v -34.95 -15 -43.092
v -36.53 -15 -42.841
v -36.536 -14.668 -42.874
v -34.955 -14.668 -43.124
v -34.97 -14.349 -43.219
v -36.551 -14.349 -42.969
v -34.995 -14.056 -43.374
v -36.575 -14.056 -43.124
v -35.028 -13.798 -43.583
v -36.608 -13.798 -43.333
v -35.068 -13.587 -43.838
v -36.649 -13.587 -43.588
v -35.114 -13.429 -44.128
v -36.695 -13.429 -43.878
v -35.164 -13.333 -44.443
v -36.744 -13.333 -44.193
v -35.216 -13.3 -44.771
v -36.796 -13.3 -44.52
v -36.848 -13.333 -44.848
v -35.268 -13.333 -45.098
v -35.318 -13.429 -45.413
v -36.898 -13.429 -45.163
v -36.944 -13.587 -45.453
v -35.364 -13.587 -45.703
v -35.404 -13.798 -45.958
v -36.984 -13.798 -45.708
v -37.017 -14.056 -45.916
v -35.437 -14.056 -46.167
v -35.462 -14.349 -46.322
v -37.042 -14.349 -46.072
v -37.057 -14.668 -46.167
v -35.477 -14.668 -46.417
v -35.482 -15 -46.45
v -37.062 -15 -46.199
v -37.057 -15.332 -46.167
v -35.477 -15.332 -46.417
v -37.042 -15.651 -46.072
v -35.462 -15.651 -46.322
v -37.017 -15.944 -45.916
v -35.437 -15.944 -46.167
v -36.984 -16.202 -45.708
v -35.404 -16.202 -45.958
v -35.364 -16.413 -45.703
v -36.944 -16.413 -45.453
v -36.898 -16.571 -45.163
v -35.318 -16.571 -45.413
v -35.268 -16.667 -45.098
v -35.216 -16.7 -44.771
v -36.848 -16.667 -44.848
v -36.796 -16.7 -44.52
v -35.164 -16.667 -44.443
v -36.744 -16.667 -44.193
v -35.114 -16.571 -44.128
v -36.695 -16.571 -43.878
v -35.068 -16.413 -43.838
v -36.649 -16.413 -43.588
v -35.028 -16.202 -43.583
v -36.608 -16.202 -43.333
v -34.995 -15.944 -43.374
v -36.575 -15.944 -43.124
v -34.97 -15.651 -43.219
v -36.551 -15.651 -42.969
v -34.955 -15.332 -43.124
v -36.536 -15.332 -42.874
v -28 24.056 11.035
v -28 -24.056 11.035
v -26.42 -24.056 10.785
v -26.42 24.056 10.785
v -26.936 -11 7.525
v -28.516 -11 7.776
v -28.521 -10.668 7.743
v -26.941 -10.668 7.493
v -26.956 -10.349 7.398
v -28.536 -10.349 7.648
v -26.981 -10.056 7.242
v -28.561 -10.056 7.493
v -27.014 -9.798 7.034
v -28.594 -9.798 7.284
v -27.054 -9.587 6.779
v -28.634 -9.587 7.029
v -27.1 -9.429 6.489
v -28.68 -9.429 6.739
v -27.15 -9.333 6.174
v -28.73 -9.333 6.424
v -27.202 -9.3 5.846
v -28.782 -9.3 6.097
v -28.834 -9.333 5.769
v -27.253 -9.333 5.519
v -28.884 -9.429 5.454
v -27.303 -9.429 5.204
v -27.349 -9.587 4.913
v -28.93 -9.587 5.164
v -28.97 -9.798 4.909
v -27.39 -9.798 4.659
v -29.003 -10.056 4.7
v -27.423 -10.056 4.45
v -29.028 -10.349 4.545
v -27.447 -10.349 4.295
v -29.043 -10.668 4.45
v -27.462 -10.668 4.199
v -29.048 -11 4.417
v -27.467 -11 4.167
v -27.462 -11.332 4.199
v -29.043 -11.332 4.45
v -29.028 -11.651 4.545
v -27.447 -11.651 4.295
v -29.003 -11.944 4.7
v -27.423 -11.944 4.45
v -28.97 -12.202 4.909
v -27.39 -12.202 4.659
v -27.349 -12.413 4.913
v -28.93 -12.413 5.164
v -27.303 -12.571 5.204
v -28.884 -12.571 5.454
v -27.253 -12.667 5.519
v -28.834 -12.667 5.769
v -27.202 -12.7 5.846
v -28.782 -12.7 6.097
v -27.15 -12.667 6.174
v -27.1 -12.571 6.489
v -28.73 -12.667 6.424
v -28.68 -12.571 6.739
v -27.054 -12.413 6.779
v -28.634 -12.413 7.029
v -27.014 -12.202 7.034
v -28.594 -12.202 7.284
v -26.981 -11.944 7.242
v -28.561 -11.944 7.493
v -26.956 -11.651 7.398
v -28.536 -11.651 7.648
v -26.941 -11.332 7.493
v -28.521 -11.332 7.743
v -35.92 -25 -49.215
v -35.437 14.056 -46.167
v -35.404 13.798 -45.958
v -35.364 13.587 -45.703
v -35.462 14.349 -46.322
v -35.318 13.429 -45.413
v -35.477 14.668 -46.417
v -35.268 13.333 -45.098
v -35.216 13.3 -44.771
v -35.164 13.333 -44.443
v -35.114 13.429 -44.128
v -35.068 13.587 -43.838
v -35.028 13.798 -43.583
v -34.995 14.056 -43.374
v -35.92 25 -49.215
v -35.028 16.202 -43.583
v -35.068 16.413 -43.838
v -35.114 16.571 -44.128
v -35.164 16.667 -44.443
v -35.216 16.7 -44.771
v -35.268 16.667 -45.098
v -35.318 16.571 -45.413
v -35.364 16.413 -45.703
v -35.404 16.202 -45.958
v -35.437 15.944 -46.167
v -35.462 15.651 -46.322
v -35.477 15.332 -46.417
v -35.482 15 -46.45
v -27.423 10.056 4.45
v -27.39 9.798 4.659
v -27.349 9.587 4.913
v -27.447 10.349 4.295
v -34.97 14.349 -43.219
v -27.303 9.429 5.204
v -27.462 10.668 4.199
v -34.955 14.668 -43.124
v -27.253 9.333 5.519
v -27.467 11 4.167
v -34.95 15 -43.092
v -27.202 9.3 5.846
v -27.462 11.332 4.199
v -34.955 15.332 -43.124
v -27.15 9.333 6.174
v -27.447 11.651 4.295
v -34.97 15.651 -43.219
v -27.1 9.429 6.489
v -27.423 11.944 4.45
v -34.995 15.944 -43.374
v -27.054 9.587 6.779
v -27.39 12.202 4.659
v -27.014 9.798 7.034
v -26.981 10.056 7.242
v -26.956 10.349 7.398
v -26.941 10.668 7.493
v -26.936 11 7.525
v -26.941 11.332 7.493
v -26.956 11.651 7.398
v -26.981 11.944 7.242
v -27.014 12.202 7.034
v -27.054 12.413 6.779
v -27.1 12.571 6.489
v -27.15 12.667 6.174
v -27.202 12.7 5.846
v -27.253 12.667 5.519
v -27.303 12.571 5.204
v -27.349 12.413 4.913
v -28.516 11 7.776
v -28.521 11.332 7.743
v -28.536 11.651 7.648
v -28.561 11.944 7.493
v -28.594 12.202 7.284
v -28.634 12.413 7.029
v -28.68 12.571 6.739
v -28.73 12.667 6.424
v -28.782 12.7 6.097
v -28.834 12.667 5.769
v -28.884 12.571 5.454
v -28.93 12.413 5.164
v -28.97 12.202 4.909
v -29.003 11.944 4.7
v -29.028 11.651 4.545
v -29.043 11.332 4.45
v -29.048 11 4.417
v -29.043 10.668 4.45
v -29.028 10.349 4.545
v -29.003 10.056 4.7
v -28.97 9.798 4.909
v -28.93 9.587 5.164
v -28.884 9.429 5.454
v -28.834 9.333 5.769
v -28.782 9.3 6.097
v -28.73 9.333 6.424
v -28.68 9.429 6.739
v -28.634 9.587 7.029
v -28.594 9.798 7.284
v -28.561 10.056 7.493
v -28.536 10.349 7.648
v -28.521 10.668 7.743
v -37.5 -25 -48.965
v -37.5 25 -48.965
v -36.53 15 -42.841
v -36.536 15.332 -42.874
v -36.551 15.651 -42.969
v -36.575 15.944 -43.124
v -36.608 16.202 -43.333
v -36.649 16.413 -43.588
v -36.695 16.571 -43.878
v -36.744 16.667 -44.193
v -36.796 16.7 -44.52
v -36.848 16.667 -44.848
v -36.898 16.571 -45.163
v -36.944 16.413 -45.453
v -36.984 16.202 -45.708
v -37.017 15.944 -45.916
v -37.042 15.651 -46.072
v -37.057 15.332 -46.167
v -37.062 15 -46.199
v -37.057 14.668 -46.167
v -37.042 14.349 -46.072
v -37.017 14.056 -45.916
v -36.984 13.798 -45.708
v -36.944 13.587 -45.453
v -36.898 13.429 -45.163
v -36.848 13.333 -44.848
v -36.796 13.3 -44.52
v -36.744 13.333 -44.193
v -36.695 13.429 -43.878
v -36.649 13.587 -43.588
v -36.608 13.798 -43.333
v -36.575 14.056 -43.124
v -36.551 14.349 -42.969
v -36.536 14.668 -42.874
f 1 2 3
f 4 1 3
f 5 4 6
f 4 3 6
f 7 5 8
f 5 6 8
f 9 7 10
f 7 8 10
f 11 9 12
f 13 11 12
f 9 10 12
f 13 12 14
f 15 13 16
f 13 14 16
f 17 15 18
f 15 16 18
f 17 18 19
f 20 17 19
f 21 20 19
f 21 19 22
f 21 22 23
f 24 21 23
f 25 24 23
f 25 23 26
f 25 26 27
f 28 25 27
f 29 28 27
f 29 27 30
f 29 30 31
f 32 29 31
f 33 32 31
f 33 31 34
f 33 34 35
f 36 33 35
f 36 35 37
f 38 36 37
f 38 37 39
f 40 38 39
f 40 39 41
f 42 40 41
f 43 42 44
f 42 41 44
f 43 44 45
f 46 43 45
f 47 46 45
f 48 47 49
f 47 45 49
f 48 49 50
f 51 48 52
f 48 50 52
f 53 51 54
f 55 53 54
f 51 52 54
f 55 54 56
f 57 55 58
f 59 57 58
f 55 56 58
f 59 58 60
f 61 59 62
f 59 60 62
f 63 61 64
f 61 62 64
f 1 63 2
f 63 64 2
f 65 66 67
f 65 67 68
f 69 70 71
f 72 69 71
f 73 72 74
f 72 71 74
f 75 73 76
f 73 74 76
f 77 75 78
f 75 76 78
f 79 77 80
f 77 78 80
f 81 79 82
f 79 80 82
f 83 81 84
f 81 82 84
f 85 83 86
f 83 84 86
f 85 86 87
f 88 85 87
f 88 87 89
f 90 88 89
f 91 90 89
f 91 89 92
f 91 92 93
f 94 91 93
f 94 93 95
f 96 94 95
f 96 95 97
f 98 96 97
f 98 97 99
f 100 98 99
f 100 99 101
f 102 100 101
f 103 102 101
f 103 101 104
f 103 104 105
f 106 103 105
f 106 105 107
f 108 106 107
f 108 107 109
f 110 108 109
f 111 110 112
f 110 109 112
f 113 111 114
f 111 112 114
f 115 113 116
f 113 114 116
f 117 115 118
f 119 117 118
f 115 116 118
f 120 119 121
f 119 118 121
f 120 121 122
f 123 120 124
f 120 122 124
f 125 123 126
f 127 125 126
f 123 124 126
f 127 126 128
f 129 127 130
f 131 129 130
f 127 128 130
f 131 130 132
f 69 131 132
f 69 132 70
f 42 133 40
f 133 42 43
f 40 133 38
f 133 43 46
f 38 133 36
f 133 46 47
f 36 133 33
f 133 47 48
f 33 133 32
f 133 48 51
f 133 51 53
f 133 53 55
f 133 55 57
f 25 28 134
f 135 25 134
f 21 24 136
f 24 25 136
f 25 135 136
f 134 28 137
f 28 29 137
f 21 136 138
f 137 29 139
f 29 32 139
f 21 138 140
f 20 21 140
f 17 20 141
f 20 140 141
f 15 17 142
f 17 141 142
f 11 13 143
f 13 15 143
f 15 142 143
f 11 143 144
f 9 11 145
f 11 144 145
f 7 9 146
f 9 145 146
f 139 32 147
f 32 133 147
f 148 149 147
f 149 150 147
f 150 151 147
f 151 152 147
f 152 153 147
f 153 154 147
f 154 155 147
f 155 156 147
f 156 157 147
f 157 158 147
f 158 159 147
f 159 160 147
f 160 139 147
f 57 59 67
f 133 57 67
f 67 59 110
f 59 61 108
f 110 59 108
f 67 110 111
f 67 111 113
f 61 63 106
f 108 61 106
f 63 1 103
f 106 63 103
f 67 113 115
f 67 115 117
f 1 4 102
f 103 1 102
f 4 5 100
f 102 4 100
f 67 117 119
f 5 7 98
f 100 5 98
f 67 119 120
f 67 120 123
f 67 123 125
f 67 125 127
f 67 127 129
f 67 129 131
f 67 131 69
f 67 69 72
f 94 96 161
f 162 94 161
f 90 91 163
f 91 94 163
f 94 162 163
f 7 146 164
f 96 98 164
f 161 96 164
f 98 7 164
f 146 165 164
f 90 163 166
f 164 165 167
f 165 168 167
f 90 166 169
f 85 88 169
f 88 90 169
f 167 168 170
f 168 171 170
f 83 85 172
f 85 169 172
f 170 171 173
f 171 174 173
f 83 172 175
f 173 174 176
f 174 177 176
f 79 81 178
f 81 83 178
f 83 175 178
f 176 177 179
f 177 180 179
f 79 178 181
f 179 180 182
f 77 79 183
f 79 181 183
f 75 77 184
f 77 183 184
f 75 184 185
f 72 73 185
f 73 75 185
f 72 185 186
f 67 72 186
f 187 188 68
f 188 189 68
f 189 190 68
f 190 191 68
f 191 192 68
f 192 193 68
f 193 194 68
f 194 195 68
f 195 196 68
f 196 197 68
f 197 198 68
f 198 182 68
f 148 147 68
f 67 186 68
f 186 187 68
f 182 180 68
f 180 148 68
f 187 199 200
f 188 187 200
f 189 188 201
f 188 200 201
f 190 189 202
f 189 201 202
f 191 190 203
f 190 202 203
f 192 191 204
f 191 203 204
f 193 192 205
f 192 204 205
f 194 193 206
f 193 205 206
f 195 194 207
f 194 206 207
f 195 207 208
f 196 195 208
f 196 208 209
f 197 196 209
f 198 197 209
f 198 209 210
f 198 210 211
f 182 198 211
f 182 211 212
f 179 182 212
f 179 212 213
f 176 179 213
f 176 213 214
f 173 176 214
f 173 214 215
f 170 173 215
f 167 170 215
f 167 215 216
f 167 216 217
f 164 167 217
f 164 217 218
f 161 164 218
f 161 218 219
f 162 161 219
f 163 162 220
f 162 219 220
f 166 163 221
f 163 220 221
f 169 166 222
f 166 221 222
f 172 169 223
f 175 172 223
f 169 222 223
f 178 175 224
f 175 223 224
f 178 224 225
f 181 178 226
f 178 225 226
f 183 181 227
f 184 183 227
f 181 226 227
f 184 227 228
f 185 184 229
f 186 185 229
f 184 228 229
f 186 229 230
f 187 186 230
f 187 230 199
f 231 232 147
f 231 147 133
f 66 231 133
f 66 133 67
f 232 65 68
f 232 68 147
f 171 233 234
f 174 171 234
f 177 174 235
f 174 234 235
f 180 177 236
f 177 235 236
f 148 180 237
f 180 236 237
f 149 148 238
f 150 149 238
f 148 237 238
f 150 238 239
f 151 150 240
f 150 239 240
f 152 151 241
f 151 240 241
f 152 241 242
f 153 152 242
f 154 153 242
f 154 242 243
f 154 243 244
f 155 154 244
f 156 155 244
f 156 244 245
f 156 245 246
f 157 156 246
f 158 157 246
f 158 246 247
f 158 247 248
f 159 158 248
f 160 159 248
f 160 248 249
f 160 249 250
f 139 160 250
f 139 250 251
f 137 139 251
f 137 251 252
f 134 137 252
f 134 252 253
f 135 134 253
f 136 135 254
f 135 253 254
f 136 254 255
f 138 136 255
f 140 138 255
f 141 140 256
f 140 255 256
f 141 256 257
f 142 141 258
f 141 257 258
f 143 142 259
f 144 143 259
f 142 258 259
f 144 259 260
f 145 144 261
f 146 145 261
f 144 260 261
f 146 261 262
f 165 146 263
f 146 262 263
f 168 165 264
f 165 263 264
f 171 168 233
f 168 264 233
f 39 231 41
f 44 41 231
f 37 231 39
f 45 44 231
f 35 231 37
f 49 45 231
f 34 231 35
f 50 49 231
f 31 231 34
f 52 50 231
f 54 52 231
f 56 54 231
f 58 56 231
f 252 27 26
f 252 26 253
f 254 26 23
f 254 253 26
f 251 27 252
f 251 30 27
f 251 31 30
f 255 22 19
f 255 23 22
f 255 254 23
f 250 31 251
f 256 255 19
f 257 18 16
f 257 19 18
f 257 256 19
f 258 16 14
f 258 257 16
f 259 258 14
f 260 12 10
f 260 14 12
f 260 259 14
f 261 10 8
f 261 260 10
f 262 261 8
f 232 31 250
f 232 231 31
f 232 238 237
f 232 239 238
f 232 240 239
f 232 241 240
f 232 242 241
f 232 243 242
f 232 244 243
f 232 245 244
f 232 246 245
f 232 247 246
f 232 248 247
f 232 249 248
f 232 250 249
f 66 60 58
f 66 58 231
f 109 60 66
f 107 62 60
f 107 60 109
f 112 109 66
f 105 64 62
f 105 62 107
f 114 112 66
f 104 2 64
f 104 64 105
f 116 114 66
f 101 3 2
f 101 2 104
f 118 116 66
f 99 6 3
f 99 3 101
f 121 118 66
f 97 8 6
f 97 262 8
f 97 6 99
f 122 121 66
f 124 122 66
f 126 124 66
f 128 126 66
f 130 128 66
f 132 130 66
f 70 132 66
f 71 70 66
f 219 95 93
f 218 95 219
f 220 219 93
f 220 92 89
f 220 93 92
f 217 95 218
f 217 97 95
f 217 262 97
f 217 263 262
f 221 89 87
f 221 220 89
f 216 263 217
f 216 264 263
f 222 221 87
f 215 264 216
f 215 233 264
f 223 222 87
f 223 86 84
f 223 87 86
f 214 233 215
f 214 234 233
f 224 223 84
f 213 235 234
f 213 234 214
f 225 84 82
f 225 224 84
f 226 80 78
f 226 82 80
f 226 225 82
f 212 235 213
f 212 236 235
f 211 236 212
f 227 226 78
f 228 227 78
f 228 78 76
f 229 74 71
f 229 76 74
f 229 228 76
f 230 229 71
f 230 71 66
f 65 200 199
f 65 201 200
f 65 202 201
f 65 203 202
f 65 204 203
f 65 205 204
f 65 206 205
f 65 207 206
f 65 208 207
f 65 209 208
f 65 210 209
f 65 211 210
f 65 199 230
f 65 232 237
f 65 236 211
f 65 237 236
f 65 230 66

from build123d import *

# Parameters (mm, degrees)
BOSS_EXTRUDE1_DEPTH    = 1.6
BACK_MOUNTING_HOLES_R  = 1.7
CUT_EXTRUDE1_DEPTH     = 11.983113317
FRONT_MOUNTING_HOLES_R = 1.7
CUT_EXTRUDE2_DEPTH     = 11.983113317


with BuildPart() as part:
    # Sketch1 → Boss-Extrude1 (new body)
    with BuildSketch(Plane(origin=(-29.019700562, 0, 4.594785922), x_dir=(-0.156385222, 0, -0.987696139), z_dir=(0.987696139, 0, -0.156385222))):
        Polygon((-6.520440675, 24.056053189), (54.226987254, 25), (54.226987254, -25), (-6.520440675, -24.056053189), align=None)
    extrude(amount=BOSS_EXTRUDE1_DEPTH)

    # Back Mounting Holes → Cut-Extrude1 (cut, through all)
    with BuildSketch(Plane(origin=(-29.019700562, 0, 4.594785922), x_dir=(0.156385222, 0, 0.987696139), z_dir=(-0.987696139, 0, 0.156385222))):
        with Locations((1.520440675, -11)):
            Circle(BACK_MOUNTING_HOLES_R)
        with Locations((1.520440675, 11)):
            Circle(BACK_MOUNTING_HOLES_R)
    extrude(amount=-CUT_EXTRUDE1_DEPTH, mode=Mode.SUBTRACT)

    # Front Mounting Holes → Cut-Extrude2 (cut, through all)
    with BuildSketch(Plane(origin=(-29.019700562, 0, 4.594785922), x_dir=(0.156385222, 0, 0.987696139), z_dir=(-0.987696139, 0, 0.156385222))):
        with Locations((-49.726987254, 15)):
            Circle(FRONT_MOUNTING_HOLES_R)
        with Locations((-49.726987254, -15)):
            Circle(FRONT_MOUNTING_HOLES_R)
    extrude(amount=-CUT_EXTRUDE2_DEPTH, mode=Mode.SUBTRACT)


solid = part.part
